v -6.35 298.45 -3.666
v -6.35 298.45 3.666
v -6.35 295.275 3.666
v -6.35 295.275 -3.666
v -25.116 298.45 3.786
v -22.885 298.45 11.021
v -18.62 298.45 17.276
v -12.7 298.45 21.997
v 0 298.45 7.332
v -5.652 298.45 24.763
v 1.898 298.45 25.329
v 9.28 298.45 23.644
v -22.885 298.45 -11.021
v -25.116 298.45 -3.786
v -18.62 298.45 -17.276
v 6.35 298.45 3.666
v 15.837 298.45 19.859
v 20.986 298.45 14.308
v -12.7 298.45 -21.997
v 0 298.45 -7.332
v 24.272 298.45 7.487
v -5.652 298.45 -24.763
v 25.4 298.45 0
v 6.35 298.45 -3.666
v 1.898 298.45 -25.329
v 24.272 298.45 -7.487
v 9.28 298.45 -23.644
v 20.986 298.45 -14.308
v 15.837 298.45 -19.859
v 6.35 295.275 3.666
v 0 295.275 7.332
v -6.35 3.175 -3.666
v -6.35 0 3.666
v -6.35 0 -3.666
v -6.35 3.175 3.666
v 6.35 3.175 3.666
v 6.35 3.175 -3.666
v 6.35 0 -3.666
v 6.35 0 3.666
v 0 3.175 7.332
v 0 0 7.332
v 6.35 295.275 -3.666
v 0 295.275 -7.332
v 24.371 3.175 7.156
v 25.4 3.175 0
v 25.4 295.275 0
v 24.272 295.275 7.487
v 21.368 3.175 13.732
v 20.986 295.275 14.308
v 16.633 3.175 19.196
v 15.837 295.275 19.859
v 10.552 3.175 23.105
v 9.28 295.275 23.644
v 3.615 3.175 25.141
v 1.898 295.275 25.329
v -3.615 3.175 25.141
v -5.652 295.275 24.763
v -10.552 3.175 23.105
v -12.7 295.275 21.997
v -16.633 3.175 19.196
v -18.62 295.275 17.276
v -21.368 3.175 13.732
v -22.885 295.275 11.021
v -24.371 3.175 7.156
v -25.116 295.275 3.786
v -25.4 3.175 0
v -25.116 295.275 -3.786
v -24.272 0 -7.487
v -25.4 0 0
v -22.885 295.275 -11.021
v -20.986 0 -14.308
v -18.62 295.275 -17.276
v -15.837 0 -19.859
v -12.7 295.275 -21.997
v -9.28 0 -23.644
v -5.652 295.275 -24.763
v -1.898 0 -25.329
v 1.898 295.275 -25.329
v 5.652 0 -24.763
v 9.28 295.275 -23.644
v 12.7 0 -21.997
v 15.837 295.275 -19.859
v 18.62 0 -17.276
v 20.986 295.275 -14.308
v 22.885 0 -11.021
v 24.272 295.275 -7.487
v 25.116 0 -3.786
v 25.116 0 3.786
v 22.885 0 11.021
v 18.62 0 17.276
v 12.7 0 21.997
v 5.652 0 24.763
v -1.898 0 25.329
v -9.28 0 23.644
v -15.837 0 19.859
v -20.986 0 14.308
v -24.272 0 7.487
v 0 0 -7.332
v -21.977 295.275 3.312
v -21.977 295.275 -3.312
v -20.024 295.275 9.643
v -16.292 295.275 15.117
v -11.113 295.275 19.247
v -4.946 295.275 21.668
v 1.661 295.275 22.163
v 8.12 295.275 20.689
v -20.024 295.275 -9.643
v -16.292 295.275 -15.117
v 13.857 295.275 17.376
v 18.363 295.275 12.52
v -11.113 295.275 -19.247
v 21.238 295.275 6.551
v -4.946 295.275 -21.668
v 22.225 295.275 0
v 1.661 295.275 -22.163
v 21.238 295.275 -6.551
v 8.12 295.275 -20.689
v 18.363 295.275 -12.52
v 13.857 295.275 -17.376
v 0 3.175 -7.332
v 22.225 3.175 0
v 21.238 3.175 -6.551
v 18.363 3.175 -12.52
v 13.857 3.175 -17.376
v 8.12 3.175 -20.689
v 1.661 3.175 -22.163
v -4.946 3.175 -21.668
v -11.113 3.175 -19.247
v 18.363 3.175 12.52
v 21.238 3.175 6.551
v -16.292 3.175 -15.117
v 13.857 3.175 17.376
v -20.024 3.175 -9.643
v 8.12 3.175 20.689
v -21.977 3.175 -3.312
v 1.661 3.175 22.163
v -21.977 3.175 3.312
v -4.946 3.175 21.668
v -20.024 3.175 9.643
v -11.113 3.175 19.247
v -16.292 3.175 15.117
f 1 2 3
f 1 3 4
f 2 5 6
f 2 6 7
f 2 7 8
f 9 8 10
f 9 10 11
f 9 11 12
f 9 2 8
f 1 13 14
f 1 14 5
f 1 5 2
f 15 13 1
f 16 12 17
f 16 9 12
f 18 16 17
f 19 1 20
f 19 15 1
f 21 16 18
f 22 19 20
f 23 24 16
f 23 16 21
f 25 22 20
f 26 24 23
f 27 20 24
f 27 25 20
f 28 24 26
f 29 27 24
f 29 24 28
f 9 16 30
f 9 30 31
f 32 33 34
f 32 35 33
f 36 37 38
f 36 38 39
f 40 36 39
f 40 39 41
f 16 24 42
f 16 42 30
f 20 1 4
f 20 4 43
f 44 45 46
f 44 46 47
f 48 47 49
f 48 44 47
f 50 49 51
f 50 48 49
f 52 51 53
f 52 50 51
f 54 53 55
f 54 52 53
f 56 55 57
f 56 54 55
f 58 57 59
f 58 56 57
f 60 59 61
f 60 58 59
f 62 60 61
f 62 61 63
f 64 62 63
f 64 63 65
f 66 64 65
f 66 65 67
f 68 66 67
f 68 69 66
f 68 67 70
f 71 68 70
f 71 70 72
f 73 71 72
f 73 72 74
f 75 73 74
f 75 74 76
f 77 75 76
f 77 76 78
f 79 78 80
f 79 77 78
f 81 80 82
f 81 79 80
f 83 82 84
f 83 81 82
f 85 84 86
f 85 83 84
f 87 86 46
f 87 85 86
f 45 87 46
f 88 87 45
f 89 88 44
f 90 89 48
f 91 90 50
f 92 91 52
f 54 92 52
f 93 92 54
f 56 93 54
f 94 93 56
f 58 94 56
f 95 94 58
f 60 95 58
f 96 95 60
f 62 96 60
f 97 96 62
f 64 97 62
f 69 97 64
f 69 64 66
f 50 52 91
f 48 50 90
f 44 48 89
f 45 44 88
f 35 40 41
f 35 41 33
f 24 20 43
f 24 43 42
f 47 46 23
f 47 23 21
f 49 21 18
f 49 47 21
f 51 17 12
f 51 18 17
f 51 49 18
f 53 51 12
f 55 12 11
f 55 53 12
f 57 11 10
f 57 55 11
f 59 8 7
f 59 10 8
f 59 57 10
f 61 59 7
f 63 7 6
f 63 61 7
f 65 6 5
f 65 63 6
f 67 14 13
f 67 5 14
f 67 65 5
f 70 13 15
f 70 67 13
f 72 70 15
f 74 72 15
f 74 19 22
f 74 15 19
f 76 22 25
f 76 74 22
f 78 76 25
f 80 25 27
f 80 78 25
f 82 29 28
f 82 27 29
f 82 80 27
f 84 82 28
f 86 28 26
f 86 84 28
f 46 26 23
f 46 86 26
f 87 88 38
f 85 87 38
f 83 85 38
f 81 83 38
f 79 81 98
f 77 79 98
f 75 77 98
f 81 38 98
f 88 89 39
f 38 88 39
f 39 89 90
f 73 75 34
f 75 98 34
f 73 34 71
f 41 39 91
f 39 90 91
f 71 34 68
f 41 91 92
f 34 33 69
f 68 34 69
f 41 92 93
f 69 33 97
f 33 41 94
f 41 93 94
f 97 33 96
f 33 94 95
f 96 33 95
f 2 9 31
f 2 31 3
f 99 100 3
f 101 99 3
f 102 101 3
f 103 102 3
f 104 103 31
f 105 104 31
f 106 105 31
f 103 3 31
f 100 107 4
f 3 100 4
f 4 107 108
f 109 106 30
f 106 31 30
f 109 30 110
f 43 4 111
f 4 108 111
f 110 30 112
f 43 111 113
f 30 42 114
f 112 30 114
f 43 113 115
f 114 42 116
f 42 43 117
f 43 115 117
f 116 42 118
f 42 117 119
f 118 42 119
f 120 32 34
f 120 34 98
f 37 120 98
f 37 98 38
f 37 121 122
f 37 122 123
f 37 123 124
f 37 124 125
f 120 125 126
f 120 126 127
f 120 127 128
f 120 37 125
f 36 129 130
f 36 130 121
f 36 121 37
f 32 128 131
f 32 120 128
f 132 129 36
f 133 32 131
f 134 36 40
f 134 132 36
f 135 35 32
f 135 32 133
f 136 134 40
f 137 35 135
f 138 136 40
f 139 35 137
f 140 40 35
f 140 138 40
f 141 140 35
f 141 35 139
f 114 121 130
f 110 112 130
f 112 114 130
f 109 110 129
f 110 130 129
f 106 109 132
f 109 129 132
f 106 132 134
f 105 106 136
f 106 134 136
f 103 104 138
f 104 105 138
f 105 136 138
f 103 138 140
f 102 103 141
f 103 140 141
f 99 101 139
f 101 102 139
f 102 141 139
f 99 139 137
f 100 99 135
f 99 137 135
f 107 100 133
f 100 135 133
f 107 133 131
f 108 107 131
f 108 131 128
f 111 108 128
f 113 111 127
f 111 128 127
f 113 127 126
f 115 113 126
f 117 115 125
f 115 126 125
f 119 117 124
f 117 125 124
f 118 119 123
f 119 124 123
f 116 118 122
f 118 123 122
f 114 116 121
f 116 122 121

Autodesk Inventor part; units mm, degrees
ref_plane "YZ Plane" through (0, 0, 0) normal (1, 0, 0) x (0, 1, 0)
ref_plane "XZ Plane" through (0, 0, 0) normal (0, 1, 0) x (-1, 0, 0)
ref_plane "XY Plane" through (0, 0, 0) normal (0, 0, 1) x (1, 0, 0)
sketch "Sketch1" plane through (0, 0, 0) normal (0, 1, 0) x (-1, 0, 0)
  circle A0 centre (0, 0) radius 25.4
  dimension "d0" = 50.8
extrude "Extrusion1" add sketch "Sketch1" along normal blind 3.175
sketch "Sketch2" plane through (0, 3.175, 0) normal (0, 1, 0) x (1, 0, 0)
  circle A0 centre (0, 0) radius 25.4
  circle A1 centre (0, 0) radius 22.225
  dimension "d3" = 3.175
  dimension "d4" = 50.8
extrude "Extrusion2" add sketch "Sketch2" along normal blind 292.1
sketch "Sketch3" plane through (0, 295.275, 0) normal (0, 1, 0) x (1, 0, 0)
  circle A0 centre (0, 0) radius 25.4
extrude "Extrusion3" add sketch "Sketch3" along normal blind 3.175
sketch "Sketch4" plane through (0, 298.45, 0) normal (0, 1, 0) x (1, 0, 0)
  line L0 (0, 7.3323) -> (6.35, 3.6662)
  line L1 (6.35, 3.6662) -> (6.35, -3.6662)
  line L2 (6.35, -3.6662) -> (0, -7.3323)
  line L3 (0, -7.3323) -> (-6.35, -3.6662)
  line L4 (-6.35, -3.6662) -> (-6.35, 3.6662)
  line L5 (-6.35, 3.6662) -> (0, 7.3323)
  point P0 (0, 0)
  point P1 (0, 0)
  dimension "d9" = 12.7
extrude "Extrusion4" cut sketch "Sketch4" against normal through all
